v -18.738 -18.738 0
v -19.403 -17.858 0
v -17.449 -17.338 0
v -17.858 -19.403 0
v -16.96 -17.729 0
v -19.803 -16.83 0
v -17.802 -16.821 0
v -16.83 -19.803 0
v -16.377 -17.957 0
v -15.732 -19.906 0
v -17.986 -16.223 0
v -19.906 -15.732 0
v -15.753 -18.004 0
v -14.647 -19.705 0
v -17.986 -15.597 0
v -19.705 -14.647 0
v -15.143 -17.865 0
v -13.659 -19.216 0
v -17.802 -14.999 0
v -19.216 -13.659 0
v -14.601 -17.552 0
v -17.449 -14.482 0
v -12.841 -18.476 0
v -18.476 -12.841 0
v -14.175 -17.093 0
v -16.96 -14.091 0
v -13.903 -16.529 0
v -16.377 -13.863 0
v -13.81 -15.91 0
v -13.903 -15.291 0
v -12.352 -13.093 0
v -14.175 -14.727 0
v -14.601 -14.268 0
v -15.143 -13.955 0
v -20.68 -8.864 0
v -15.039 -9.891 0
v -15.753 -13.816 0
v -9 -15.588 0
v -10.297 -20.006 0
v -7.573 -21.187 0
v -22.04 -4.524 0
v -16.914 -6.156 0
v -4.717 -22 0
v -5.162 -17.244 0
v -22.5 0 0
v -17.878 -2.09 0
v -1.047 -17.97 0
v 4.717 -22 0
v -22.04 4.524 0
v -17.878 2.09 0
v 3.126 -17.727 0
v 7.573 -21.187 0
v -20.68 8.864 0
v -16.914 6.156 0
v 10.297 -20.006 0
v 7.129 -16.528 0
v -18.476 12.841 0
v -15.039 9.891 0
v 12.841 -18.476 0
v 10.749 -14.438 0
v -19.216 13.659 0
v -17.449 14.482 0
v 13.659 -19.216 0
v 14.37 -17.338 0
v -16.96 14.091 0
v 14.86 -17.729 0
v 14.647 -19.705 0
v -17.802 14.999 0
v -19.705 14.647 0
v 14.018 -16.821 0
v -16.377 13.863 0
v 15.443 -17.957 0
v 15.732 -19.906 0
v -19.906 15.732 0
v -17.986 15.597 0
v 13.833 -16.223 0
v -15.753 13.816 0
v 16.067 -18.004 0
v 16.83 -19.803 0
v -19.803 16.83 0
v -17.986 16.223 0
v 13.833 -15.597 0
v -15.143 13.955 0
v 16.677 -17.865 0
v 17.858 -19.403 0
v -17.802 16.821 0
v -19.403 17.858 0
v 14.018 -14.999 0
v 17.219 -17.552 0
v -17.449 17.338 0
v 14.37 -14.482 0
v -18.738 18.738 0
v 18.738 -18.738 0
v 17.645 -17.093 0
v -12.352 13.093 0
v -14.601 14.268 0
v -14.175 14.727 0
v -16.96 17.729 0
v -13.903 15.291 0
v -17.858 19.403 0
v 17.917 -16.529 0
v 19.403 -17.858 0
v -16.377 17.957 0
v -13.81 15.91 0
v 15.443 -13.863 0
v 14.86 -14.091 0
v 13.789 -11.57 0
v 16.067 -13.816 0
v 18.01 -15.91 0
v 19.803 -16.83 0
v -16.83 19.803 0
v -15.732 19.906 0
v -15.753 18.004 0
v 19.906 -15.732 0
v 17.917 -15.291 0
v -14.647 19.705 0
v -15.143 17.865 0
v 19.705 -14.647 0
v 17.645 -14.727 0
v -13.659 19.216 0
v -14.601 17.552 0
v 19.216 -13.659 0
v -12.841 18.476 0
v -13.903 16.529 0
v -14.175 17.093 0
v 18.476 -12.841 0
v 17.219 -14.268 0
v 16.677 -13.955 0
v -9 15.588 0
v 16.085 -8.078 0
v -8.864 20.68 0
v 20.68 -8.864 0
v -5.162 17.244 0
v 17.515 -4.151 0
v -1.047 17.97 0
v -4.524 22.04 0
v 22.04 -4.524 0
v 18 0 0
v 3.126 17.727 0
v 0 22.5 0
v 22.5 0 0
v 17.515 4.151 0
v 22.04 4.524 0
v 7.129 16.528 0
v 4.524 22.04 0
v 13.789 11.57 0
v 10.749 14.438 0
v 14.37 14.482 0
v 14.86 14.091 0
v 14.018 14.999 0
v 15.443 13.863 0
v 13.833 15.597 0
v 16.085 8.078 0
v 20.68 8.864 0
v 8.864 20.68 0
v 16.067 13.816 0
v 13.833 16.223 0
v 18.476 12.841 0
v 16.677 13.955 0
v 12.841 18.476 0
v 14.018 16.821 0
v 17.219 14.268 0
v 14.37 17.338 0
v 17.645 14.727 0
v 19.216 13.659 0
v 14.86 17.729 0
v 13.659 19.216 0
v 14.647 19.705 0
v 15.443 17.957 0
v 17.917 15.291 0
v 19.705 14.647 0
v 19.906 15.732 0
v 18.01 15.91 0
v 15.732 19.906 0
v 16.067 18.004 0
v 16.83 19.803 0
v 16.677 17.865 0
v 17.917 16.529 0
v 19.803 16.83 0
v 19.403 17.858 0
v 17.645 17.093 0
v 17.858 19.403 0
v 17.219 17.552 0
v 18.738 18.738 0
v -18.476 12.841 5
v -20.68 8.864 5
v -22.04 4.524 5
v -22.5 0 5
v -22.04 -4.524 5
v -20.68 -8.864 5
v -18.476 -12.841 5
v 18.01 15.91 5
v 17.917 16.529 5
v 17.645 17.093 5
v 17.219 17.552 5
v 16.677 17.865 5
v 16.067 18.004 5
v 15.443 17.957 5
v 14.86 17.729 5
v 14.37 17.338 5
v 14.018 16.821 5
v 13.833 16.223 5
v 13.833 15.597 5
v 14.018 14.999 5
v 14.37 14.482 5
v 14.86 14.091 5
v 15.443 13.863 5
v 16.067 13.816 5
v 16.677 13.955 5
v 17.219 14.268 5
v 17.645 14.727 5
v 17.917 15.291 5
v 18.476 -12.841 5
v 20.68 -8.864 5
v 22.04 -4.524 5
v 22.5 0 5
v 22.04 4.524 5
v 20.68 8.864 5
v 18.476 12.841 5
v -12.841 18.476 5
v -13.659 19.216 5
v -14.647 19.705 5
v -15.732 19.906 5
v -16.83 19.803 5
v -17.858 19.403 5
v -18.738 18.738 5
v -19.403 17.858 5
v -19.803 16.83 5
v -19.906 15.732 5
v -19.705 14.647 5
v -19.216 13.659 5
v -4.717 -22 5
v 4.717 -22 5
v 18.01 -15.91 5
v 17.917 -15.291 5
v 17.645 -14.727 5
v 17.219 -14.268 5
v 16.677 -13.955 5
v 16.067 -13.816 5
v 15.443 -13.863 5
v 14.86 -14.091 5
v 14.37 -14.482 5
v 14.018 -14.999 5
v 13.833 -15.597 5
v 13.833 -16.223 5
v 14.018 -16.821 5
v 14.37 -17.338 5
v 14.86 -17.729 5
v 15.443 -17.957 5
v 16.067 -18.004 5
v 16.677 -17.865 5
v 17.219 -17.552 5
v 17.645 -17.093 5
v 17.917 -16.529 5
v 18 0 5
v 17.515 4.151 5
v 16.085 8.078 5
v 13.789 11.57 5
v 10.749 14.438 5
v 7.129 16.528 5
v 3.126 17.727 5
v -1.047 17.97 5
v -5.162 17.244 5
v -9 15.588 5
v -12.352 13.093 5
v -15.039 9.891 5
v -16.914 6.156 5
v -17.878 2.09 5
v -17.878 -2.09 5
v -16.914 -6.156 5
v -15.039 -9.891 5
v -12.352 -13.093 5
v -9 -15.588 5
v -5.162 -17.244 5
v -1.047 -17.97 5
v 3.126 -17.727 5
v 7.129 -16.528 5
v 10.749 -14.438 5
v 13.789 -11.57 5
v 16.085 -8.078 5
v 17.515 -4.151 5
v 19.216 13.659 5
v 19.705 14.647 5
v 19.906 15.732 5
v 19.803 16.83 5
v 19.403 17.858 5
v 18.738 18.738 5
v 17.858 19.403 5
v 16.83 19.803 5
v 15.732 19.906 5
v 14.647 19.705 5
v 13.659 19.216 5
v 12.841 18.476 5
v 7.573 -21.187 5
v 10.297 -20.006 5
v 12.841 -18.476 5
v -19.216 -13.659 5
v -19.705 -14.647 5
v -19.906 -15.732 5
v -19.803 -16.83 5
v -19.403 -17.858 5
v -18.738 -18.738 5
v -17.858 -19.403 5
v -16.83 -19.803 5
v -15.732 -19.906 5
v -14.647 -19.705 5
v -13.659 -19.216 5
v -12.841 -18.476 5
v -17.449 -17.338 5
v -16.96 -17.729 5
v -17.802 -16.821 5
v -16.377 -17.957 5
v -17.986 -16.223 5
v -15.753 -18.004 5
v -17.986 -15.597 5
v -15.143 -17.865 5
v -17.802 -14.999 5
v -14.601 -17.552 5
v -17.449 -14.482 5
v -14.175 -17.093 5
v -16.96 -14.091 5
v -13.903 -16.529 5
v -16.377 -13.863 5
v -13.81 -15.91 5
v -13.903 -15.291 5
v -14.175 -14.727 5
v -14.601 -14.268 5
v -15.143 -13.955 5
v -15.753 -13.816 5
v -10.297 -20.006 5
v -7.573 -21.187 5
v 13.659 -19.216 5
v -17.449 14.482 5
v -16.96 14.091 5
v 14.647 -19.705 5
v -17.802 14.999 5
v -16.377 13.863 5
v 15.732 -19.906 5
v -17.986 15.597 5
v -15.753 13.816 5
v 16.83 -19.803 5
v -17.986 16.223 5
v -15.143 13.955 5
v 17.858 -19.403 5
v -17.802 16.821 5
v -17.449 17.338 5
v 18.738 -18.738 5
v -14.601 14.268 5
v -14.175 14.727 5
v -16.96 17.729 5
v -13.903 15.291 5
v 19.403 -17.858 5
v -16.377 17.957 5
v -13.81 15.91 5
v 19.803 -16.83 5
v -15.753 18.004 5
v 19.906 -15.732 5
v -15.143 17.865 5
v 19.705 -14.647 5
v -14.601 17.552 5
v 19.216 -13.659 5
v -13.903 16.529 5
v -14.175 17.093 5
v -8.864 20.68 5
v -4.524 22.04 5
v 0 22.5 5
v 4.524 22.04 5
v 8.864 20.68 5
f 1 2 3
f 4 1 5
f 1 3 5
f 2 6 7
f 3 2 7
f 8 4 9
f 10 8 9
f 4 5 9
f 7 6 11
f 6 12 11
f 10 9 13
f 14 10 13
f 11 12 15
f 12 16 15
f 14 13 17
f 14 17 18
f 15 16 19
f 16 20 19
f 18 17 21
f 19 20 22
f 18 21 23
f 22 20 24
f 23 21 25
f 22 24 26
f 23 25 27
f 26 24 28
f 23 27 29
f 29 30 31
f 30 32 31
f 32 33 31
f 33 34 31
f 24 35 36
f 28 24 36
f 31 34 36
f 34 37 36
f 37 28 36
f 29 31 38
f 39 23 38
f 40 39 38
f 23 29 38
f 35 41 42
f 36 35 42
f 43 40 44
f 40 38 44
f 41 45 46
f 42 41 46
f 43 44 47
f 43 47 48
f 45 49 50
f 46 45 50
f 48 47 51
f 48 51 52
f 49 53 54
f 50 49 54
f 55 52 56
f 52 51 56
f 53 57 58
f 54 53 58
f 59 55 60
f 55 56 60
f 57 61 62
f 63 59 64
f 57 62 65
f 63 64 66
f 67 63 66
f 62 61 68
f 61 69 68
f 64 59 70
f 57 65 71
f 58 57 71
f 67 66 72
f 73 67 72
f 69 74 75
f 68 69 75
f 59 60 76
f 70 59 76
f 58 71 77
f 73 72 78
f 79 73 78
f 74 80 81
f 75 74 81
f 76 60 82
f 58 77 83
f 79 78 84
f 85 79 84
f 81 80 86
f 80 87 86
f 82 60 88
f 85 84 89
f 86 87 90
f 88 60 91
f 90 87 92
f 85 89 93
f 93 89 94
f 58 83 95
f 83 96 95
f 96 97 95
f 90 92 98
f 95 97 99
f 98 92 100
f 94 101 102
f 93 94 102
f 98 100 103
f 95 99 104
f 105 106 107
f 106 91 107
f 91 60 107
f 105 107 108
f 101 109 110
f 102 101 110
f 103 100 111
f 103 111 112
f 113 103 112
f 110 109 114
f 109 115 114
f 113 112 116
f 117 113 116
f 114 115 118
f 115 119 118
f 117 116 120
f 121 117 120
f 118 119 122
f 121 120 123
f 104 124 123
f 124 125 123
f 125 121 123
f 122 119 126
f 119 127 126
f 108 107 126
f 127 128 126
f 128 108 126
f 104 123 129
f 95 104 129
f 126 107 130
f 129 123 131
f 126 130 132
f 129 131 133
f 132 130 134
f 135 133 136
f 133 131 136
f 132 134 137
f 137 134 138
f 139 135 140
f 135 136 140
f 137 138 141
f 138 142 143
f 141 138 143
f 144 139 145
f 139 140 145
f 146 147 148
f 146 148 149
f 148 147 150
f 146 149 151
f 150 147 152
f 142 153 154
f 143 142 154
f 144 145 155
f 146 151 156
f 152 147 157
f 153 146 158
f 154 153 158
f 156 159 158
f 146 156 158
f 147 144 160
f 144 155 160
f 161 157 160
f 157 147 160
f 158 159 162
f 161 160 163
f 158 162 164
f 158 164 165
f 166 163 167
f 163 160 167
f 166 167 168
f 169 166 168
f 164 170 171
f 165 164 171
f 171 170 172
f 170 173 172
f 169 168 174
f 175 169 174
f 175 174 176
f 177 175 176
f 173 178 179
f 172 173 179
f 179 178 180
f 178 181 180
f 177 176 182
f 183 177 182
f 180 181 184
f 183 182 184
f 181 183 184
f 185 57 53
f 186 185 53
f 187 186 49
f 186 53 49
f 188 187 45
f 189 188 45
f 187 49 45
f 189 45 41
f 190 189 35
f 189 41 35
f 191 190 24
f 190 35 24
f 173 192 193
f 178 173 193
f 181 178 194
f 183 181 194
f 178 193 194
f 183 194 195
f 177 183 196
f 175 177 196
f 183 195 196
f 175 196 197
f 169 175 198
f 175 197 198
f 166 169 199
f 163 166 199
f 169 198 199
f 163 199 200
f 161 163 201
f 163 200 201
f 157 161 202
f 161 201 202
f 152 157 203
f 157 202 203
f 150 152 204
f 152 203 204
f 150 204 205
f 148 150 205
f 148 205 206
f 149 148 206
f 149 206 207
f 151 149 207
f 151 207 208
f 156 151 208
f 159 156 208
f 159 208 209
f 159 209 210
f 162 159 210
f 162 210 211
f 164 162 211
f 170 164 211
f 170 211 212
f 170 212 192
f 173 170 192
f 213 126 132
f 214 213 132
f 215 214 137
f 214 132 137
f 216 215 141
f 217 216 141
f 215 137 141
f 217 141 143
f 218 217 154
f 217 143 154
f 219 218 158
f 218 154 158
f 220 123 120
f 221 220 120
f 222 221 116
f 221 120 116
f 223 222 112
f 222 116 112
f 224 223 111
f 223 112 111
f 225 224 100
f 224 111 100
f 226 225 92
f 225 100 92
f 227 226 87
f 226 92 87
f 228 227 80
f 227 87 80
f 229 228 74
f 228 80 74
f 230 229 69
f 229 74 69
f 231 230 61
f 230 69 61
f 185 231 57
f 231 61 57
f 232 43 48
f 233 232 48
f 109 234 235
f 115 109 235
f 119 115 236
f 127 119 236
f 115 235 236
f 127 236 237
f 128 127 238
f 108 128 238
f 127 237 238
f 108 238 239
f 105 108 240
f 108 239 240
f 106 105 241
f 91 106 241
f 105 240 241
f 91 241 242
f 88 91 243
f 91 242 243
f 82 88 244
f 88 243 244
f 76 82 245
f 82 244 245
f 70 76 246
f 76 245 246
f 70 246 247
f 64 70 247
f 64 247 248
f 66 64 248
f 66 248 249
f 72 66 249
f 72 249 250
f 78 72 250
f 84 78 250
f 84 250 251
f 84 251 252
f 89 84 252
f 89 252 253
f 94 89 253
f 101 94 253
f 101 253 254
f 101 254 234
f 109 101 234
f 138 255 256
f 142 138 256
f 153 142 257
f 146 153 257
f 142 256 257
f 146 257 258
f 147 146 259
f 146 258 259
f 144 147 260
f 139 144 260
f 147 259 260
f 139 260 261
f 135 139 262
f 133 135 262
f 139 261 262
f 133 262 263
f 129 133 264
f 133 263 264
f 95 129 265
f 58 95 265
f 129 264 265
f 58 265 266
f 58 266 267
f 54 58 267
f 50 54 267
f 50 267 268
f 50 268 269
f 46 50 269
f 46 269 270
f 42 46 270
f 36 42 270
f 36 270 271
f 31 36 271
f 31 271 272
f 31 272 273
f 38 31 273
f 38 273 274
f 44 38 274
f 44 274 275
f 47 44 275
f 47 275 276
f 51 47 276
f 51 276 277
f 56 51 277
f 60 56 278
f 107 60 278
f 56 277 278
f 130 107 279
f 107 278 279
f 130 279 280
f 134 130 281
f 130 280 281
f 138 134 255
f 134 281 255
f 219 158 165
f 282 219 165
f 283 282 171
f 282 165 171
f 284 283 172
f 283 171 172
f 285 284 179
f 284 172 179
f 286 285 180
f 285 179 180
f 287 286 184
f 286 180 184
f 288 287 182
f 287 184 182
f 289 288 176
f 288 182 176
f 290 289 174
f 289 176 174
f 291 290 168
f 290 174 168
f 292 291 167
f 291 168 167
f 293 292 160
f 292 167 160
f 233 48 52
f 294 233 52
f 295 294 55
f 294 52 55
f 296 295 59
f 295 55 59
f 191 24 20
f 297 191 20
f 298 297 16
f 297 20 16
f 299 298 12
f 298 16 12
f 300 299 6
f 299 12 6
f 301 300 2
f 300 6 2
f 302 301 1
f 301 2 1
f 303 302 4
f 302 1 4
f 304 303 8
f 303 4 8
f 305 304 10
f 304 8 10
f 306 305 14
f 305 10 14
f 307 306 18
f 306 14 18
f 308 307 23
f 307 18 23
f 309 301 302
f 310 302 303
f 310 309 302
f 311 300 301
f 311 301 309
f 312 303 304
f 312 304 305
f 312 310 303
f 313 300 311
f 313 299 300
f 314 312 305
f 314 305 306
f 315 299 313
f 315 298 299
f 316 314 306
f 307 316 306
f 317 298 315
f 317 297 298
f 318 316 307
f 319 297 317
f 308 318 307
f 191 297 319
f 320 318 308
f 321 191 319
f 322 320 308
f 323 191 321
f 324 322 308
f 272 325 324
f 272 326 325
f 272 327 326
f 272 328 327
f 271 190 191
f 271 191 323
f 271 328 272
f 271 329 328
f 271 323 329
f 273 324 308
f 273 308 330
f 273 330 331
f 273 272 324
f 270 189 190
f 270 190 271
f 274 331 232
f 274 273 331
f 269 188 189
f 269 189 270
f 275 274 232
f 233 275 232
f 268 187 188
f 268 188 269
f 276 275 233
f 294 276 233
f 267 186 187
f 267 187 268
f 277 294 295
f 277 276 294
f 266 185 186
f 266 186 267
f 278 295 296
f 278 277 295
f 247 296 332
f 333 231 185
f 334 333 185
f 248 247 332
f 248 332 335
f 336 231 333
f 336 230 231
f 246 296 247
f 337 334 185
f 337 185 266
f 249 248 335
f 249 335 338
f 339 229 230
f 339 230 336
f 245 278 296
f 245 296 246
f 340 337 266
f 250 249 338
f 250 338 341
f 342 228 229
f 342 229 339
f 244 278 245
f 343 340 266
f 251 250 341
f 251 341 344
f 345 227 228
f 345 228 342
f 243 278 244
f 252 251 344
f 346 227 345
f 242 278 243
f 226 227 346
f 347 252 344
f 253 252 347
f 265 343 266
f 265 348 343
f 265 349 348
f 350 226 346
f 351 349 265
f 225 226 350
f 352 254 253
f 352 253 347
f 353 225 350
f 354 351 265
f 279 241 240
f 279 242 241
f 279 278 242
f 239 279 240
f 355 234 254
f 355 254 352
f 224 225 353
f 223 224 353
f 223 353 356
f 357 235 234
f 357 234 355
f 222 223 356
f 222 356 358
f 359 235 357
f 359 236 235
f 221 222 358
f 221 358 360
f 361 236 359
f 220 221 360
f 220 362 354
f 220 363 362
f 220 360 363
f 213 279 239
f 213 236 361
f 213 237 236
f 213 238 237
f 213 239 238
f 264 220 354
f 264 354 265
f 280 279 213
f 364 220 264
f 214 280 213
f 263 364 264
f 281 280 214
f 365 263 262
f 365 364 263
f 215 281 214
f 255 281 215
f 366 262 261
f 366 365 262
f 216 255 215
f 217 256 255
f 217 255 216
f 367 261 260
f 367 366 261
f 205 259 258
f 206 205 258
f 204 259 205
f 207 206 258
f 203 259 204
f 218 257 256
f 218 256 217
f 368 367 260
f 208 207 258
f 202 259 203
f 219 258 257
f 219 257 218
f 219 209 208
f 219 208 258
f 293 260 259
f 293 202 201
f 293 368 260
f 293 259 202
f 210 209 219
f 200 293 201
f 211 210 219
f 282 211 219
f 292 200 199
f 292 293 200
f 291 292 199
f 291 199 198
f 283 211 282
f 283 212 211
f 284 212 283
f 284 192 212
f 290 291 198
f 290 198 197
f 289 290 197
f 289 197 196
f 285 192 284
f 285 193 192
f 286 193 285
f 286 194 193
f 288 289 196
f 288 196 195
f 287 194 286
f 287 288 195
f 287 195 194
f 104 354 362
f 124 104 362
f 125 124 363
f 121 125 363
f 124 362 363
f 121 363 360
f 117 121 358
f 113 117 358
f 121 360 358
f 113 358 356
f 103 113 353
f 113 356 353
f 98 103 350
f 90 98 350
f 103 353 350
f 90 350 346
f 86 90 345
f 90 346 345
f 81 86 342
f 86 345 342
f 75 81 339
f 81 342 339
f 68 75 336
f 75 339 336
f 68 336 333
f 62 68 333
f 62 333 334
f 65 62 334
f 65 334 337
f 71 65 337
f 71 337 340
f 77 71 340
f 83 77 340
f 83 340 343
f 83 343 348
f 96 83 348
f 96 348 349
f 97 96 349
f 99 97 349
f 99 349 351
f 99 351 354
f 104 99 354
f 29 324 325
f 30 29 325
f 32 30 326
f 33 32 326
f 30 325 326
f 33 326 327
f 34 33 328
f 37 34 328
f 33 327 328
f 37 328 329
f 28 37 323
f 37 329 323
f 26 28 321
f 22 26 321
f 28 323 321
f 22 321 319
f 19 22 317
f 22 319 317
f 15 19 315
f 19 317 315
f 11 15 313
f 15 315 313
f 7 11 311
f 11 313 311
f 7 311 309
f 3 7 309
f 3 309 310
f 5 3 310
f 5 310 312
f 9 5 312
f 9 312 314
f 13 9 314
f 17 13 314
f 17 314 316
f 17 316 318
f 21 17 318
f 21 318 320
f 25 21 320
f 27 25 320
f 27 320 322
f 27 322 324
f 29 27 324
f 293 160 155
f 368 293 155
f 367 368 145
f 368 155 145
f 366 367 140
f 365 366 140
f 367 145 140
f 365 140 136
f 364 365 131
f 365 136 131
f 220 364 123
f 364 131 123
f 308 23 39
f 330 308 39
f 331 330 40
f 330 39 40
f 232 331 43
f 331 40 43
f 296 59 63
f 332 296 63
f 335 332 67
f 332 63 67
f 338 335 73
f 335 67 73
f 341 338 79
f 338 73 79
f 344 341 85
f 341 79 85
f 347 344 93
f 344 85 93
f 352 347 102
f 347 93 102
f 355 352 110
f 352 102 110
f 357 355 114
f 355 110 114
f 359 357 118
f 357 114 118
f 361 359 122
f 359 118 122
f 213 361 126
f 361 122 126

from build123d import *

# Parameters (mm, degrees)
F1_DEPTH = 5
F2_R     = 2.1
F3_DEPTH = 5.001
F4_R     = 18
F5_DEPTH = 5.001


with BuildPart() as f1:
    # F0 (on Top) → F1 (new body)
    with BuildSketch(Plane.XY):
        with BuildLine():
            ThreePointArc((18.475718, 12.841256), (18.73833, 18.73833), (12.841256, 18.475718))
            ThreePointArc((12.841256, 18.475718), (0, 22.5), (-12.841256, 18.475718))
            ThreePointArc((-12.841256, 18.475718), (-18.73833, 18.73833), (-18.475718, 12.841256))
            ThreePointArc((-18.475718, 12.841256), (-22.5, 0), (-18.475718, -12.841256))
            ThreePointArc((-18.475718, -12.841256), (-18.73833, -18.73833), (-12.841256, -18.475718))
            ThreePointArc((-12.841256, -18.475718), (-8.954225, -20.641508), (-4.716991, -22))
            Line((-4.716991, -22), (4.716991, -22))
            ThreePointArc((4.716991, -22), (8.954225, -20.641508), (12.841256, -18.475718))
            ThreePointArc((12.841256, -18.475718), (18.73833, -18.73833), (18.475718, -12.841256))
            ThreePointArc((18.475718, -12.841256), (22.5, 0), (18.475718, 12.841256))
        make_face()
    extrude(amount=F1_DEPTH)

    # F2 (on face) → F3 (cut, through all)
    with BuildSketch(Plane.XY.offset(5)):
        with Locations((-15.909903, 15.909903)):
            Circle(F2_R)
        with Locations((15.909903, 15.909903)):
            Circle(F2_R)
        with Locations((15.909903, -15.909903)):
            Circle(F2_R)
        with Locations((-15.909903, -15.909903)):
            Circle(F2_R)
    extrude(amount=-F3_DEPTH, mode=Mode.SUBTRACT)

    # F4 (on face) → F5 (cut, through all)
    with BuildSketch(Plane.XY.offset(5)):
        Circle(F4_R)
    extrude(amount=-F5_DEPTH, mode=Mode.SUBTRACT)


solid = f1.part
